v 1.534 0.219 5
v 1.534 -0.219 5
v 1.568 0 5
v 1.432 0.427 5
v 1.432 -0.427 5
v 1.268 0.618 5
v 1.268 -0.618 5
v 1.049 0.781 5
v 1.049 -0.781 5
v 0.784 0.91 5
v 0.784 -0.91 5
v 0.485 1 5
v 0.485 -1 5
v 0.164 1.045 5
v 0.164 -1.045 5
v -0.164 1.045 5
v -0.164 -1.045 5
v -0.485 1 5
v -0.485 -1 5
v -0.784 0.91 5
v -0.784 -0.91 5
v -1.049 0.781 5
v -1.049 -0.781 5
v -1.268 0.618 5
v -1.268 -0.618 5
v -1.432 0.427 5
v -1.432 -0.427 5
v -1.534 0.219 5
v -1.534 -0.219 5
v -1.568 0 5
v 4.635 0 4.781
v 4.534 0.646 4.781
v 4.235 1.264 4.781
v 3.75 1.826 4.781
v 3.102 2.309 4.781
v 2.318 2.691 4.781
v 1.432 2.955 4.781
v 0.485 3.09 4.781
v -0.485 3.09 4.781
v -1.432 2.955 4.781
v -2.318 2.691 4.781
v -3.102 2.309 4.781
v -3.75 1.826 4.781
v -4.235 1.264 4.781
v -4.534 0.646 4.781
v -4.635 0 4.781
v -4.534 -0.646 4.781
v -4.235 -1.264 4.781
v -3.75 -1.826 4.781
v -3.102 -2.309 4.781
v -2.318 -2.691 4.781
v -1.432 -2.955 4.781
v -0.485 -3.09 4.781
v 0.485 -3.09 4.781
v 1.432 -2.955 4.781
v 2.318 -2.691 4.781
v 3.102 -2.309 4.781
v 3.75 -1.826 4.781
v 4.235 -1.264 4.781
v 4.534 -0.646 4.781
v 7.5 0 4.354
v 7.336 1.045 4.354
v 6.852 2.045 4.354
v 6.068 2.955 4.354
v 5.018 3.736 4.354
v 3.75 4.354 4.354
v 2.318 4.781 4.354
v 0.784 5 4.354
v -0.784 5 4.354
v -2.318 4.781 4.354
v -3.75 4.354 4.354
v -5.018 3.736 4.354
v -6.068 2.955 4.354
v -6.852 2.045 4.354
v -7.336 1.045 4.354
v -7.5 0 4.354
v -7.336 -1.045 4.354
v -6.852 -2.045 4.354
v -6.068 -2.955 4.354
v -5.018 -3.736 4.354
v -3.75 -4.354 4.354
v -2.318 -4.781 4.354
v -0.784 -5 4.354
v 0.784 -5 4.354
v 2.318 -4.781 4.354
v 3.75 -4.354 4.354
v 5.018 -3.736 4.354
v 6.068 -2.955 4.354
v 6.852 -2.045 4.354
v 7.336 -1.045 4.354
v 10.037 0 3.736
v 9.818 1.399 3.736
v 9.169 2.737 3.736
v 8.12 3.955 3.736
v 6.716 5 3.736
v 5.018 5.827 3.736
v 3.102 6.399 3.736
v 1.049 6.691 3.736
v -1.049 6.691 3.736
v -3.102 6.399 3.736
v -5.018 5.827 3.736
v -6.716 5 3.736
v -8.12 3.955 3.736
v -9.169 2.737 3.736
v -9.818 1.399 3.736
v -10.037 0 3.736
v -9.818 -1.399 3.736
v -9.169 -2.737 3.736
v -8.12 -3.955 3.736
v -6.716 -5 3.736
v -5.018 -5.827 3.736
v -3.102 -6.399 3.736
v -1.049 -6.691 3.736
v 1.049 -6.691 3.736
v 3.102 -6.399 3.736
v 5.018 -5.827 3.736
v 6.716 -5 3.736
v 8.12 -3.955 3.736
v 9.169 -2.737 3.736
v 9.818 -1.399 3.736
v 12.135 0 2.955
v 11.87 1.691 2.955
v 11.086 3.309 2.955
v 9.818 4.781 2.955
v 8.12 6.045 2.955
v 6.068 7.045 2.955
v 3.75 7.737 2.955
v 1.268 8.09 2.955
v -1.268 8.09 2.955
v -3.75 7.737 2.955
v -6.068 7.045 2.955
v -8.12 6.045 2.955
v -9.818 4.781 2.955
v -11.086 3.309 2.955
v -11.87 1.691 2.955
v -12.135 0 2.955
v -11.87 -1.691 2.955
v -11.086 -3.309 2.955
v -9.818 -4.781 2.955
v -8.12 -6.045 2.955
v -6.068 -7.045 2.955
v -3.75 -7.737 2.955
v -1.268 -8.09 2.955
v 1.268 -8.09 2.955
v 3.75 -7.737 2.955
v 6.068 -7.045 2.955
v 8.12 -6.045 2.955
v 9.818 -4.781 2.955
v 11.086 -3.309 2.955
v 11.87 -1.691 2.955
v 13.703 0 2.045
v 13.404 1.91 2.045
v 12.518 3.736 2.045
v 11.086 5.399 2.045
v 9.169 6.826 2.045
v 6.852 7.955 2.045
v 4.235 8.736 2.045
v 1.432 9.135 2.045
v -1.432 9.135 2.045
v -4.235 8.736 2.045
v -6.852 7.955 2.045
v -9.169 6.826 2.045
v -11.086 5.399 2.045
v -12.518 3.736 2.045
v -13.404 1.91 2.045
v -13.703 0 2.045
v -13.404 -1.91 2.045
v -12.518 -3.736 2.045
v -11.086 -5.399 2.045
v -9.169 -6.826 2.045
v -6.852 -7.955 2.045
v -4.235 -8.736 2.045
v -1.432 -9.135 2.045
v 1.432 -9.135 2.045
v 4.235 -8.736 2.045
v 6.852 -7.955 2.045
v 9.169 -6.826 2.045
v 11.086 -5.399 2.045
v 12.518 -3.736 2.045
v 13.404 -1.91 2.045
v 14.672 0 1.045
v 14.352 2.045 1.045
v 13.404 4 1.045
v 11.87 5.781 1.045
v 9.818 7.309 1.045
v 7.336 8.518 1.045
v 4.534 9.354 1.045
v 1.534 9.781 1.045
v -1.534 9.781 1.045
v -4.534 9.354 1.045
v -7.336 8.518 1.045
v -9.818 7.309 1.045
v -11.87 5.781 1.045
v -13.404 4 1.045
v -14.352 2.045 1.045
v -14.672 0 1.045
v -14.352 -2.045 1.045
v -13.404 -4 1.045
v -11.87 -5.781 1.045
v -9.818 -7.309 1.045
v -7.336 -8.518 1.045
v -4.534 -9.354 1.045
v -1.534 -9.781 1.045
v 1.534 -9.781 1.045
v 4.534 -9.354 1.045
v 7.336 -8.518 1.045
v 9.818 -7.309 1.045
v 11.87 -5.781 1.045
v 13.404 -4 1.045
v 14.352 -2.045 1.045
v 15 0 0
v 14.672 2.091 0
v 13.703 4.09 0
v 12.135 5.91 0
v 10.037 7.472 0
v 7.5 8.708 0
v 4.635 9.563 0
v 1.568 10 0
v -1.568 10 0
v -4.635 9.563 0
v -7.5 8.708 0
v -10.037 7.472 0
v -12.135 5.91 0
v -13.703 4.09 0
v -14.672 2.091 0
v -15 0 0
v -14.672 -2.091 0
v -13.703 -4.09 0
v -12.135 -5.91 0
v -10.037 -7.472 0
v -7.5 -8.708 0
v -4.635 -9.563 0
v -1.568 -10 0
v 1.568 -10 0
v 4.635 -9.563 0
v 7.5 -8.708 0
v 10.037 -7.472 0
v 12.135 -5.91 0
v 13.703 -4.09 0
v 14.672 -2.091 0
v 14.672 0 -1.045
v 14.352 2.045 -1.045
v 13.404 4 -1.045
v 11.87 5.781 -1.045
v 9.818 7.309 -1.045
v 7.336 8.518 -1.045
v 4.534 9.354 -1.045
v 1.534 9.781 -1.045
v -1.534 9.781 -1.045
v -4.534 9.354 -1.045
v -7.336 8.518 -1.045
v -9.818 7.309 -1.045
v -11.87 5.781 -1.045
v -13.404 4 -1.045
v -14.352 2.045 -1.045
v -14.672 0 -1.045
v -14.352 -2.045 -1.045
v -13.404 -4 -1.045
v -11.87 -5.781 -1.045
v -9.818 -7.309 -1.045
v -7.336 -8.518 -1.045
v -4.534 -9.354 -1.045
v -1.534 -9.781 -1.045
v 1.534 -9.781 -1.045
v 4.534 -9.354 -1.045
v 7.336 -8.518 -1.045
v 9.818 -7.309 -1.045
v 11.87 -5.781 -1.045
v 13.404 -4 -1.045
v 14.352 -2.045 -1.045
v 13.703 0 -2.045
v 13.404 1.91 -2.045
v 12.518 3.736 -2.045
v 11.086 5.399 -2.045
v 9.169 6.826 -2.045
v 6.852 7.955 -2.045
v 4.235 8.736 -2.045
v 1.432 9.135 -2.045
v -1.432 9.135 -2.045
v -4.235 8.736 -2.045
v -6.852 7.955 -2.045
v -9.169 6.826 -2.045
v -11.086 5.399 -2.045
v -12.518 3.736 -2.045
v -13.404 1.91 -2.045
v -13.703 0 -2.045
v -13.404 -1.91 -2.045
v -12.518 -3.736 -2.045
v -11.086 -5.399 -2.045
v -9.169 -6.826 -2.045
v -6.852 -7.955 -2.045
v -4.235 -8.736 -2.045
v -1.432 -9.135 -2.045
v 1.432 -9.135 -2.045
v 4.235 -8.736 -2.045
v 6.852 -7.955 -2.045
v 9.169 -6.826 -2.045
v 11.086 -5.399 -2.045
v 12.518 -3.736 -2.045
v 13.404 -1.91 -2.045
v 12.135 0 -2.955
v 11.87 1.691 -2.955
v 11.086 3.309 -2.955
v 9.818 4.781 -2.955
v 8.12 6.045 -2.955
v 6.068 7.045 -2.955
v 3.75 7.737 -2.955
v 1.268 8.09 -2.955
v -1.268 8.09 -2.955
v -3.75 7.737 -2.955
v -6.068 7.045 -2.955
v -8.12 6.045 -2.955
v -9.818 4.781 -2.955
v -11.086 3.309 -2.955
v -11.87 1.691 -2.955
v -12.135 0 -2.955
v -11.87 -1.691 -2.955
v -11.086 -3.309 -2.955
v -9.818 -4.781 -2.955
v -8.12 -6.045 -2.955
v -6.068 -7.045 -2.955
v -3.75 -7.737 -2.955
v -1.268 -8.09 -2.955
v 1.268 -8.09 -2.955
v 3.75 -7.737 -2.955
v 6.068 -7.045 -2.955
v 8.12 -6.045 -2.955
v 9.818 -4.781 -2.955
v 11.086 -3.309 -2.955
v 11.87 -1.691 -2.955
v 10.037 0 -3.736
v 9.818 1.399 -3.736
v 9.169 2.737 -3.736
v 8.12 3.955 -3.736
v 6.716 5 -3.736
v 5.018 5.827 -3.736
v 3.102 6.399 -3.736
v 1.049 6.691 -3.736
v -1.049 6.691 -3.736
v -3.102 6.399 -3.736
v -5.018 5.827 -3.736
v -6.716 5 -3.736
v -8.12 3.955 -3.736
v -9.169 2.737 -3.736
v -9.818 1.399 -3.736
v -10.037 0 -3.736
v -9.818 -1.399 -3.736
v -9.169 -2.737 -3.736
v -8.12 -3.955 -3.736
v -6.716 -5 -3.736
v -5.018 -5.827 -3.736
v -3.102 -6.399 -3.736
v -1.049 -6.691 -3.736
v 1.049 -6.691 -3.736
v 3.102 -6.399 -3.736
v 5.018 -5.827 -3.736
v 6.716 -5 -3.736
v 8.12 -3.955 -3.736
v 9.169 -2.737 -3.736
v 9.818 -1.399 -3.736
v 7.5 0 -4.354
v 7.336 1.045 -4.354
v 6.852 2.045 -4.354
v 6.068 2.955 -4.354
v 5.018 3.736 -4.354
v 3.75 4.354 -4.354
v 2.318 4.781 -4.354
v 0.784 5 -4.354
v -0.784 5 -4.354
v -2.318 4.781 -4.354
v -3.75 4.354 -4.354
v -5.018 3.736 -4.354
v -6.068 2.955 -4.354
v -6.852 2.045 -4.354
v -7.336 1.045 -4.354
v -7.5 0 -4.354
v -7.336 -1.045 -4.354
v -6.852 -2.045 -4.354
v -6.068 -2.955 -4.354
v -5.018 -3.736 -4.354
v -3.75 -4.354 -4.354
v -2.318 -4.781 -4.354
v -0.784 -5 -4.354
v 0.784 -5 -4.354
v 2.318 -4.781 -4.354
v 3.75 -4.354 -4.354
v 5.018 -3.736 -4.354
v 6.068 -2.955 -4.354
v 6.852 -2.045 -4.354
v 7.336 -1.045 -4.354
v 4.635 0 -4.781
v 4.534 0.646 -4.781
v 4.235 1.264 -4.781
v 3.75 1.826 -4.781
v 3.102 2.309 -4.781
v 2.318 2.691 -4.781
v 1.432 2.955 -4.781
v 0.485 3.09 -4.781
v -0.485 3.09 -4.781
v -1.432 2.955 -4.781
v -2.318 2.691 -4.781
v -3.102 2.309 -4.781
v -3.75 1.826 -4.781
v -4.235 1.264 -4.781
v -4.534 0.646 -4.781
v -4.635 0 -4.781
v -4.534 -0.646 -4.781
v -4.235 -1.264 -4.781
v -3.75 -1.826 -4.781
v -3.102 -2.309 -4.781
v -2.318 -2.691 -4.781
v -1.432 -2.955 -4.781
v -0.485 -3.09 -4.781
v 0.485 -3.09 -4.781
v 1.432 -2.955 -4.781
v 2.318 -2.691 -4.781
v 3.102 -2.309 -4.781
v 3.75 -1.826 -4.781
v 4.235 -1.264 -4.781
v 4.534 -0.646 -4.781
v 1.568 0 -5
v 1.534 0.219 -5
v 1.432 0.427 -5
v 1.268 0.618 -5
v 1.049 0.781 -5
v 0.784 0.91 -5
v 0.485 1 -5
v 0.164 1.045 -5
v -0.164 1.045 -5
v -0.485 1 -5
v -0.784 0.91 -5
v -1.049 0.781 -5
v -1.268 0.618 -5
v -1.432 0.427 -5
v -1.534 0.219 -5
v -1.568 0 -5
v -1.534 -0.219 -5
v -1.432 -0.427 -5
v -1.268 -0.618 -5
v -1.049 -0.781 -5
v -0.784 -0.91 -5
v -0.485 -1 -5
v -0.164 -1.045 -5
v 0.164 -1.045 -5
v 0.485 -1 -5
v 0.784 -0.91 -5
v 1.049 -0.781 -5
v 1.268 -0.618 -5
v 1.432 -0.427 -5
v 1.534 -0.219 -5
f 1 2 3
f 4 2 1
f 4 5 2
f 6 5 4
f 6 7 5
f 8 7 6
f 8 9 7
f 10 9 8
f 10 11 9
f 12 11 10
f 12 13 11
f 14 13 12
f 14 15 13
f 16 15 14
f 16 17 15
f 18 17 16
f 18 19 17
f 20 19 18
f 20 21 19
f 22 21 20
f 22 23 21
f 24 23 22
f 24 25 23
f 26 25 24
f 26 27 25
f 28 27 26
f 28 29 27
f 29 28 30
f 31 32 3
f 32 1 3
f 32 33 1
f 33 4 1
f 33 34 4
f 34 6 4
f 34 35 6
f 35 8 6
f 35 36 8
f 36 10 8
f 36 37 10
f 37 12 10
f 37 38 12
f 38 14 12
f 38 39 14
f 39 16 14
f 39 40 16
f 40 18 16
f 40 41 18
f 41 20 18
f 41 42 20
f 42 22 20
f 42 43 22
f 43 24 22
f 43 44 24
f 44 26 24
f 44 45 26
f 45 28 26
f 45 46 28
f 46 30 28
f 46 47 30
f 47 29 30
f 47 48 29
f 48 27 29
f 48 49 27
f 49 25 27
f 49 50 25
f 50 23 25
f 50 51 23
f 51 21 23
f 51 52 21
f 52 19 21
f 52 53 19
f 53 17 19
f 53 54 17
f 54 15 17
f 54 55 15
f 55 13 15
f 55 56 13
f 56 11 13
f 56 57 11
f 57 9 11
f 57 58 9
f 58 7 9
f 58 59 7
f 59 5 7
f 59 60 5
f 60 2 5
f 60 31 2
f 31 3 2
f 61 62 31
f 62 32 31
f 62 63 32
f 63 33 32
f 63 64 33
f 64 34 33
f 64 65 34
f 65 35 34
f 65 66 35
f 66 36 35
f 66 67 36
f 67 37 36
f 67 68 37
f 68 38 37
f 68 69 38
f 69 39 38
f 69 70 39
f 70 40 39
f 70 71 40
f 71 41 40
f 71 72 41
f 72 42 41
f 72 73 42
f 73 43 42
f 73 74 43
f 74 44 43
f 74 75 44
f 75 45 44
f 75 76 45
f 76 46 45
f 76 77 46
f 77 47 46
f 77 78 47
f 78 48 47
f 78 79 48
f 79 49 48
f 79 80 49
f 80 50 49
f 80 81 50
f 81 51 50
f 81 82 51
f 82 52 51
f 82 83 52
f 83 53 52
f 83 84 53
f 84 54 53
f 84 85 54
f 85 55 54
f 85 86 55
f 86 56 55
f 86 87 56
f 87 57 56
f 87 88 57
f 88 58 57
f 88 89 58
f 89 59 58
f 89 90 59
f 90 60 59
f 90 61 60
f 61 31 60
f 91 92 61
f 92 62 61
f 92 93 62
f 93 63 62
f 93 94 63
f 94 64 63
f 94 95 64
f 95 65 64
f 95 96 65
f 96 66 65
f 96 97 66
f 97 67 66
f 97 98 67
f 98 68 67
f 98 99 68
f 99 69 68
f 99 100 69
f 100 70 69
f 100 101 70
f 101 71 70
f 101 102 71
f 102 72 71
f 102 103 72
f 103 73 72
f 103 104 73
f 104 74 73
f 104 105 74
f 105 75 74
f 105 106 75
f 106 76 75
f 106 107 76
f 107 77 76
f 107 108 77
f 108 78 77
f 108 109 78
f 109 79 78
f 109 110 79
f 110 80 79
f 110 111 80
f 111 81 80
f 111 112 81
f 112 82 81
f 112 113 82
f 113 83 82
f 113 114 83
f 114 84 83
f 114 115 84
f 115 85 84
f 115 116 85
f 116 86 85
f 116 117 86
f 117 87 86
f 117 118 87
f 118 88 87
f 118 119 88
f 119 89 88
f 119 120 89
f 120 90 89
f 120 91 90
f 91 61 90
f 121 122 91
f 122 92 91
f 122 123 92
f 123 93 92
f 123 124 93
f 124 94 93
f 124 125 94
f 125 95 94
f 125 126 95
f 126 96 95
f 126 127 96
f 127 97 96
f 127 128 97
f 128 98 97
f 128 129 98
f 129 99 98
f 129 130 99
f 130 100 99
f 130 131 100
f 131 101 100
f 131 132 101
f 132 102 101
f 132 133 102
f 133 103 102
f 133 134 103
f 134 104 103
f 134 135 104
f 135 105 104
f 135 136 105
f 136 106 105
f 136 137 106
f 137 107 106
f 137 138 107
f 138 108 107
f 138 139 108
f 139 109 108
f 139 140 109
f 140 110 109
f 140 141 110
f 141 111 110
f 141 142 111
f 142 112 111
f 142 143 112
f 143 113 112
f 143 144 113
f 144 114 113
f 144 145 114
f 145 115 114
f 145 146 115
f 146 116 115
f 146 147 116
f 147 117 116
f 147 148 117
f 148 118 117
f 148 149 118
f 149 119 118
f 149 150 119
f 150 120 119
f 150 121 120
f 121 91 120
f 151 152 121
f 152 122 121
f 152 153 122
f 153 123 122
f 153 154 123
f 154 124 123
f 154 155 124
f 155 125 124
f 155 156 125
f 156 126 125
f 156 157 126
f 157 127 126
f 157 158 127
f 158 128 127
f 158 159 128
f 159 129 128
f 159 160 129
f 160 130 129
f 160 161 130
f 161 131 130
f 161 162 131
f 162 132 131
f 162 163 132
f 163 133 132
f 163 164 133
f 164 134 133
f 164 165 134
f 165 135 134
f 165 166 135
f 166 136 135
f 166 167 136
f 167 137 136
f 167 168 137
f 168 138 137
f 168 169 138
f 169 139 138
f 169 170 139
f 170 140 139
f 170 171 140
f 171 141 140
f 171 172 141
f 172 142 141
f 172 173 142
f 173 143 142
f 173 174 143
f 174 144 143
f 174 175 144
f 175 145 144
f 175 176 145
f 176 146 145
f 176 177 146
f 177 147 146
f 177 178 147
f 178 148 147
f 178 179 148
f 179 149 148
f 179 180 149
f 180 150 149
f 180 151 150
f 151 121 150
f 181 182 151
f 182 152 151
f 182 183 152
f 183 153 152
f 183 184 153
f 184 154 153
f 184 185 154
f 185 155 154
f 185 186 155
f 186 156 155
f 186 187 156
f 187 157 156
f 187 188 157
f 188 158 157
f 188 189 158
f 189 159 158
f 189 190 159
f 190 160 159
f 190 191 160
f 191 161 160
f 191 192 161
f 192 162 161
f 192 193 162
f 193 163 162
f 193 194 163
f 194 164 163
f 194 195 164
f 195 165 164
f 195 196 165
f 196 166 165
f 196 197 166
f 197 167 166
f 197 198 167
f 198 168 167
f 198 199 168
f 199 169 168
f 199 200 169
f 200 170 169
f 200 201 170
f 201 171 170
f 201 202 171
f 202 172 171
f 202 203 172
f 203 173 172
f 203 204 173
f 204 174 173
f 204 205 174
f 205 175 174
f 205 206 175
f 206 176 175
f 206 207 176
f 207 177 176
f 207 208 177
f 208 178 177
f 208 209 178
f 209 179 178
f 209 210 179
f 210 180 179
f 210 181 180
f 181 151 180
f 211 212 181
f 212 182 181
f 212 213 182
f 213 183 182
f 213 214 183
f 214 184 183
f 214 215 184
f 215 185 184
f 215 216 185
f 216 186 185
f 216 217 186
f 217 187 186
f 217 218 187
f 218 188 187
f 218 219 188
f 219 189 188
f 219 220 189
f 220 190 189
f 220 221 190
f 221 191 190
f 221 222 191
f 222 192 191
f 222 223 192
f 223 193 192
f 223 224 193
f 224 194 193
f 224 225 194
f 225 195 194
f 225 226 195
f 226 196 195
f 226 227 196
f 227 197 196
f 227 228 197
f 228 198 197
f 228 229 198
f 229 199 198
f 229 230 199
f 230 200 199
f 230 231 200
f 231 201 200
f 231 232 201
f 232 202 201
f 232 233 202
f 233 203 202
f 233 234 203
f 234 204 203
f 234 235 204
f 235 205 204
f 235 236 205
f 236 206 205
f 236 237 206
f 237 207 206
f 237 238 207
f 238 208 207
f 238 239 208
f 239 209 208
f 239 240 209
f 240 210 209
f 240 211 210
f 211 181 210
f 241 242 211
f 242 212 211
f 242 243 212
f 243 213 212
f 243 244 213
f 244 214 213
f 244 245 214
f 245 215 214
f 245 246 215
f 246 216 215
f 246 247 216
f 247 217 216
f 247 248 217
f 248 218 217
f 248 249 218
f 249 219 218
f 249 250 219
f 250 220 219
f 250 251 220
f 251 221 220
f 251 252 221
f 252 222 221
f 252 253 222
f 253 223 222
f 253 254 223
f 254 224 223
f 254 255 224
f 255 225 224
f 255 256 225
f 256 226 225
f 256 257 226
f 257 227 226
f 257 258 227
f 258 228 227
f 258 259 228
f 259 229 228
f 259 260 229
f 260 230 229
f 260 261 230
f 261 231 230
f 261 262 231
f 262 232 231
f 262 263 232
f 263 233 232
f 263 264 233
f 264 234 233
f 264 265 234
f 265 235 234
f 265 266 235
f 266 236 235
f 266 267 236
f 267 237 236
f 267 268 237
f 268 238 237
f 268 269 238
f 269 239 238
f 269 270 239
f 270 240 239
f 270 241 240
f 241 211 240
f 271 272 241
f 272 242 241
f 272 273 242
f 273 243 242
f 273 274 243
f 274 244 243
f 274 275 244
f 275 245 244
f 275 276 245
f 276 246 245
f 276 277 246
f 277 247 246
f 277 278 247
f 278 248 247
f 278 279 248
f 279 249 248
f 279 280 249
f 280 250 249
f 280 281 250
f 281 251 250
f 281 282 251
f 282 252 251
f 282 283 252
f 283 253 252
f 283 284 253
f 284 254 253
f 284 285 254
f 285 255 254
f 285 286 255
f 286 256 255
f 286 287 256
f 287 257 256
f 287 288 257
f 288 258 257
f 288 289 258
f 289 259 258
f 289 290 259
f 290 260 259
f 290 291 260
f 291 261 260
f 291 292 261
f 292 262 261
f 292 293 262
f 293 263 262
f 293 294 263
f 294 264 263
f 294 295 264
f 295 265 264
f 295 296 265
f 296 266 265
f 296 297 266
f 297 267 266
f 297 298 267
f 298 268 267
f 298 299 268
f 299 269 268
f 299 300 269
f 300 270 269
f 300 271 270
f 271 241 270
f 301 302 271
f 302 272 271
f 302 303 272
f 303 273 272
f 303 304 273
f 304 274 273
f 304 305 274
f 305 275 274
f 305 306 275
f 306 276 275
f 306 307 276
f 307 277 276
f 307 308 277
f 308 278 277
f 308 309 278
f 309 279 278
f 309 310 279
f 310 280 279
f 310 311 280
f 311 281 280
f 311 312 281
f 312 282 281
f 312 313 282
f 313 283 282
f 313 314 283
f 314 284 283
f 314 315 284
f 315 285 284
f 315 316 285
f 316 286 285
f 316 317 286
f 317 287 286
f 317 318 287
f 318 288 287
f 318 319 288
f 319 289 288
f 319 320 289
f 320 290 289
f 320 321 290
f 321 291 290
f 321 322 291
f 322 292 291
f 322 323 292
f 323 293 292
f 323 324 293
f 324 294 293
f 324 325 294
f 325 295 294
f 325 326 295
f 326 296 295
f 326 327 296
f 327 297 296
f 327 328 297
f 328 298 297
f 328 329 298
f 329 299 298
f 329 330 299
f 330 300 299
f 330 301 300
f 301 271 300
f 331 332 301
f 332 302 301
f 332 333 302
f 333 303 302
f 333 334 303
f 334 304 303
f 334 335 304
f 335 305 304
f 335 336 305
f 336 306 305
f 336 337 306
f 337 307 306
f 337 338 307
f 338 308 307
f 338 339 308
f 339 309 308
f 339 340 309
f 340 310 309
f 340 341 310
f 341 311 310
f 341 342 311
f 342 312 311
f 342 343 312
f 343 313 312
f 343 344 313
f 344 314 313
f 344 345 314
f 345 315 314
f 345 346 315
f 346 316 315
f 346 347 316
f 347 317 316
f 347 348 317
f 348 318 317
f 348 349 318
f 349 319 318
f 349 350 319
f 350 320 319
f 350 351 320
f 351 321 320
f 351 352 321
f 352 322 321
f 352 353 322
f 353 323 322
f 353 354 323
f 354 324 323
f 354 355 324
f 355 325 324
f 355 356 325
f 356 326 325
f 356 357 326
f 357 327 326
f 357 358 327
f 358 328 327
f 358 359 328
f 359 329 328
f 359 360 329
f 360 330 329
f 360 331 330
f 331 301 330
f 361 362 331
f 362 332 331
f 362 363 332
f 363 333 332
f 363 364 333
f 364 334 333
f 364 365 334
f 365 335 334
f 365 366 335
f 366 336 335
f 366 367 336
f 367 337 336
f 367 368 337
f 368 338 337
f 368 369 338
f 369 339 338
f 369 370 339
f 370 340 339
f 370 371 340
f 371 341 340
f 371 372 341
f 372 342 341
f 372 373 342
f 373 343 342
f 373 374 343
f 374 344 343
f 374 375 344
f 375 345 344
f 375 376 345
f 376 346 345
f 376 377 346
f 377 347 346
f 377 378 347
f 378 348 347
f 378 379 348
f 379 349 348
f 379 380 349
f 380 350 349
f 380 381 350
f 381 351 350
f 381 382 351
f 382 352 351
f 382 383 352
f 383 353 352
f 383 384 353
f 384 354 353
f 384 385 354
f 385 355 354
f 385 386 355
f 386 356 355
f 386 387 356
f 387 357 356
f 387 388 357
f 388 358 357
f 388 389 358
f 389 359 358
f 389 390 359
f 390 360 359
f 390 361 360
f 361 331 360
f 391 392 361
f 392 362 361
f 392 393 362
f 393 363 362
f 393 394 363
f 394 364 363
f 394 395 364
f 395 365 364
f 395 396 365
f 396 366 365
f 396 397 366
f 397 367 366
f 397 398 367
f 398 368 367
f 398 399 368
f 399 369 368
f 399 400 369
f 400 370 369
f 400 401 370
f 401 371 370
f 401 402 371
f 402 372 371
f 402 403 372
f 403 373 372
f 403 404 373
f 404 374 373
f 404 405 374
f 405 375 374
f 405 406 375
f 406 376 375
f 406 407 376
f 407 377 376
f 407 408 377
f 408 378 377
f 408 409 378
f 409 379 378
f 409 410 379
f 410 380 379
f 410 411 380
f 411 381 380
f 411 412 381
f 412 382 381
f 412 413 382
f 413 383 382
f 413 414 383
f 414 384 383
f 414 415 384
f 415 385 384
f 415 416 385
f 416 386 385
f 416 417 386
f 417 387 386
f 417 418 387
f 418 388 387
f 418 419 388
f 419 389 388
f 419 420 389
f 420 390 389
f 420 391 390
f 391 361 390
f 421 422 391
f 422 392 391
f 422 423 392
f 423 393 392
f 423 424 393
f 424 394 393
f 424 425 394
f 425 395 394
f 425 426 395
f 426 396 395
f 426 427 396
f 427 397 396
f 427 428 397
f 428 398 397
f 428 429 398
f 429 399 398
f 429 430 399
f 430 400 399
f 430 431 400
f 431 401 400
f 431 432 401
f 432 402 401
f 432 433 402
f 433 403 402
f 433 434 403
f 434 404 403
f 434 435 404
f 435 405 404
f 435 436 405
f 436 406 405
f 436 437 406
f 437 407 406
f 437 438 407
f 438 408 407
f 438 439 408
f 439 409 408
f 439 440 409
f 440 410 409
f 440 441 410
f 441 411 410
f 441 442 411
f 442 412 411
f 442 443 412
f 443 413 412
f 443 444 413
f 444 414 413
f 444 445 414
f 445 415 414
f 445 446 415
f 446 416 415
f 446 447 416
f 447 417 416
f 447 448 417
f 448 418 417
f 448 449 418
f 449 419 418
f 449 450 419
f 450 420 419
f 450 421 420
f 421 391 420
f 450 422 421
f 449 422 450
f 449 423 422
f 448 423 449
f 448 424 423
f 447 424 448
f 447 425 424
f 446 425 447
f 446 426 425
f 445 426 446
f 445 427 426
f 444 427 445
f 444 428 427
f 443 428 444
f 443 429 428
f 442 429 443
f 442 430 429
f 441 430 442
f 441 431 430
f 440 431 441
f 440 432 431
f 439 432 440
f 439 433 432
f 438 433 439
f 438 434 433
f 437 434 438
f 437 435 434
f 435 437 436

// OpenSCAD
// Unit of length: Unit.MM
resize(newsize = [30.0, 20.0, 10.0], auto = [false, false, false])
{
   sphere(d = 30.0);
}
